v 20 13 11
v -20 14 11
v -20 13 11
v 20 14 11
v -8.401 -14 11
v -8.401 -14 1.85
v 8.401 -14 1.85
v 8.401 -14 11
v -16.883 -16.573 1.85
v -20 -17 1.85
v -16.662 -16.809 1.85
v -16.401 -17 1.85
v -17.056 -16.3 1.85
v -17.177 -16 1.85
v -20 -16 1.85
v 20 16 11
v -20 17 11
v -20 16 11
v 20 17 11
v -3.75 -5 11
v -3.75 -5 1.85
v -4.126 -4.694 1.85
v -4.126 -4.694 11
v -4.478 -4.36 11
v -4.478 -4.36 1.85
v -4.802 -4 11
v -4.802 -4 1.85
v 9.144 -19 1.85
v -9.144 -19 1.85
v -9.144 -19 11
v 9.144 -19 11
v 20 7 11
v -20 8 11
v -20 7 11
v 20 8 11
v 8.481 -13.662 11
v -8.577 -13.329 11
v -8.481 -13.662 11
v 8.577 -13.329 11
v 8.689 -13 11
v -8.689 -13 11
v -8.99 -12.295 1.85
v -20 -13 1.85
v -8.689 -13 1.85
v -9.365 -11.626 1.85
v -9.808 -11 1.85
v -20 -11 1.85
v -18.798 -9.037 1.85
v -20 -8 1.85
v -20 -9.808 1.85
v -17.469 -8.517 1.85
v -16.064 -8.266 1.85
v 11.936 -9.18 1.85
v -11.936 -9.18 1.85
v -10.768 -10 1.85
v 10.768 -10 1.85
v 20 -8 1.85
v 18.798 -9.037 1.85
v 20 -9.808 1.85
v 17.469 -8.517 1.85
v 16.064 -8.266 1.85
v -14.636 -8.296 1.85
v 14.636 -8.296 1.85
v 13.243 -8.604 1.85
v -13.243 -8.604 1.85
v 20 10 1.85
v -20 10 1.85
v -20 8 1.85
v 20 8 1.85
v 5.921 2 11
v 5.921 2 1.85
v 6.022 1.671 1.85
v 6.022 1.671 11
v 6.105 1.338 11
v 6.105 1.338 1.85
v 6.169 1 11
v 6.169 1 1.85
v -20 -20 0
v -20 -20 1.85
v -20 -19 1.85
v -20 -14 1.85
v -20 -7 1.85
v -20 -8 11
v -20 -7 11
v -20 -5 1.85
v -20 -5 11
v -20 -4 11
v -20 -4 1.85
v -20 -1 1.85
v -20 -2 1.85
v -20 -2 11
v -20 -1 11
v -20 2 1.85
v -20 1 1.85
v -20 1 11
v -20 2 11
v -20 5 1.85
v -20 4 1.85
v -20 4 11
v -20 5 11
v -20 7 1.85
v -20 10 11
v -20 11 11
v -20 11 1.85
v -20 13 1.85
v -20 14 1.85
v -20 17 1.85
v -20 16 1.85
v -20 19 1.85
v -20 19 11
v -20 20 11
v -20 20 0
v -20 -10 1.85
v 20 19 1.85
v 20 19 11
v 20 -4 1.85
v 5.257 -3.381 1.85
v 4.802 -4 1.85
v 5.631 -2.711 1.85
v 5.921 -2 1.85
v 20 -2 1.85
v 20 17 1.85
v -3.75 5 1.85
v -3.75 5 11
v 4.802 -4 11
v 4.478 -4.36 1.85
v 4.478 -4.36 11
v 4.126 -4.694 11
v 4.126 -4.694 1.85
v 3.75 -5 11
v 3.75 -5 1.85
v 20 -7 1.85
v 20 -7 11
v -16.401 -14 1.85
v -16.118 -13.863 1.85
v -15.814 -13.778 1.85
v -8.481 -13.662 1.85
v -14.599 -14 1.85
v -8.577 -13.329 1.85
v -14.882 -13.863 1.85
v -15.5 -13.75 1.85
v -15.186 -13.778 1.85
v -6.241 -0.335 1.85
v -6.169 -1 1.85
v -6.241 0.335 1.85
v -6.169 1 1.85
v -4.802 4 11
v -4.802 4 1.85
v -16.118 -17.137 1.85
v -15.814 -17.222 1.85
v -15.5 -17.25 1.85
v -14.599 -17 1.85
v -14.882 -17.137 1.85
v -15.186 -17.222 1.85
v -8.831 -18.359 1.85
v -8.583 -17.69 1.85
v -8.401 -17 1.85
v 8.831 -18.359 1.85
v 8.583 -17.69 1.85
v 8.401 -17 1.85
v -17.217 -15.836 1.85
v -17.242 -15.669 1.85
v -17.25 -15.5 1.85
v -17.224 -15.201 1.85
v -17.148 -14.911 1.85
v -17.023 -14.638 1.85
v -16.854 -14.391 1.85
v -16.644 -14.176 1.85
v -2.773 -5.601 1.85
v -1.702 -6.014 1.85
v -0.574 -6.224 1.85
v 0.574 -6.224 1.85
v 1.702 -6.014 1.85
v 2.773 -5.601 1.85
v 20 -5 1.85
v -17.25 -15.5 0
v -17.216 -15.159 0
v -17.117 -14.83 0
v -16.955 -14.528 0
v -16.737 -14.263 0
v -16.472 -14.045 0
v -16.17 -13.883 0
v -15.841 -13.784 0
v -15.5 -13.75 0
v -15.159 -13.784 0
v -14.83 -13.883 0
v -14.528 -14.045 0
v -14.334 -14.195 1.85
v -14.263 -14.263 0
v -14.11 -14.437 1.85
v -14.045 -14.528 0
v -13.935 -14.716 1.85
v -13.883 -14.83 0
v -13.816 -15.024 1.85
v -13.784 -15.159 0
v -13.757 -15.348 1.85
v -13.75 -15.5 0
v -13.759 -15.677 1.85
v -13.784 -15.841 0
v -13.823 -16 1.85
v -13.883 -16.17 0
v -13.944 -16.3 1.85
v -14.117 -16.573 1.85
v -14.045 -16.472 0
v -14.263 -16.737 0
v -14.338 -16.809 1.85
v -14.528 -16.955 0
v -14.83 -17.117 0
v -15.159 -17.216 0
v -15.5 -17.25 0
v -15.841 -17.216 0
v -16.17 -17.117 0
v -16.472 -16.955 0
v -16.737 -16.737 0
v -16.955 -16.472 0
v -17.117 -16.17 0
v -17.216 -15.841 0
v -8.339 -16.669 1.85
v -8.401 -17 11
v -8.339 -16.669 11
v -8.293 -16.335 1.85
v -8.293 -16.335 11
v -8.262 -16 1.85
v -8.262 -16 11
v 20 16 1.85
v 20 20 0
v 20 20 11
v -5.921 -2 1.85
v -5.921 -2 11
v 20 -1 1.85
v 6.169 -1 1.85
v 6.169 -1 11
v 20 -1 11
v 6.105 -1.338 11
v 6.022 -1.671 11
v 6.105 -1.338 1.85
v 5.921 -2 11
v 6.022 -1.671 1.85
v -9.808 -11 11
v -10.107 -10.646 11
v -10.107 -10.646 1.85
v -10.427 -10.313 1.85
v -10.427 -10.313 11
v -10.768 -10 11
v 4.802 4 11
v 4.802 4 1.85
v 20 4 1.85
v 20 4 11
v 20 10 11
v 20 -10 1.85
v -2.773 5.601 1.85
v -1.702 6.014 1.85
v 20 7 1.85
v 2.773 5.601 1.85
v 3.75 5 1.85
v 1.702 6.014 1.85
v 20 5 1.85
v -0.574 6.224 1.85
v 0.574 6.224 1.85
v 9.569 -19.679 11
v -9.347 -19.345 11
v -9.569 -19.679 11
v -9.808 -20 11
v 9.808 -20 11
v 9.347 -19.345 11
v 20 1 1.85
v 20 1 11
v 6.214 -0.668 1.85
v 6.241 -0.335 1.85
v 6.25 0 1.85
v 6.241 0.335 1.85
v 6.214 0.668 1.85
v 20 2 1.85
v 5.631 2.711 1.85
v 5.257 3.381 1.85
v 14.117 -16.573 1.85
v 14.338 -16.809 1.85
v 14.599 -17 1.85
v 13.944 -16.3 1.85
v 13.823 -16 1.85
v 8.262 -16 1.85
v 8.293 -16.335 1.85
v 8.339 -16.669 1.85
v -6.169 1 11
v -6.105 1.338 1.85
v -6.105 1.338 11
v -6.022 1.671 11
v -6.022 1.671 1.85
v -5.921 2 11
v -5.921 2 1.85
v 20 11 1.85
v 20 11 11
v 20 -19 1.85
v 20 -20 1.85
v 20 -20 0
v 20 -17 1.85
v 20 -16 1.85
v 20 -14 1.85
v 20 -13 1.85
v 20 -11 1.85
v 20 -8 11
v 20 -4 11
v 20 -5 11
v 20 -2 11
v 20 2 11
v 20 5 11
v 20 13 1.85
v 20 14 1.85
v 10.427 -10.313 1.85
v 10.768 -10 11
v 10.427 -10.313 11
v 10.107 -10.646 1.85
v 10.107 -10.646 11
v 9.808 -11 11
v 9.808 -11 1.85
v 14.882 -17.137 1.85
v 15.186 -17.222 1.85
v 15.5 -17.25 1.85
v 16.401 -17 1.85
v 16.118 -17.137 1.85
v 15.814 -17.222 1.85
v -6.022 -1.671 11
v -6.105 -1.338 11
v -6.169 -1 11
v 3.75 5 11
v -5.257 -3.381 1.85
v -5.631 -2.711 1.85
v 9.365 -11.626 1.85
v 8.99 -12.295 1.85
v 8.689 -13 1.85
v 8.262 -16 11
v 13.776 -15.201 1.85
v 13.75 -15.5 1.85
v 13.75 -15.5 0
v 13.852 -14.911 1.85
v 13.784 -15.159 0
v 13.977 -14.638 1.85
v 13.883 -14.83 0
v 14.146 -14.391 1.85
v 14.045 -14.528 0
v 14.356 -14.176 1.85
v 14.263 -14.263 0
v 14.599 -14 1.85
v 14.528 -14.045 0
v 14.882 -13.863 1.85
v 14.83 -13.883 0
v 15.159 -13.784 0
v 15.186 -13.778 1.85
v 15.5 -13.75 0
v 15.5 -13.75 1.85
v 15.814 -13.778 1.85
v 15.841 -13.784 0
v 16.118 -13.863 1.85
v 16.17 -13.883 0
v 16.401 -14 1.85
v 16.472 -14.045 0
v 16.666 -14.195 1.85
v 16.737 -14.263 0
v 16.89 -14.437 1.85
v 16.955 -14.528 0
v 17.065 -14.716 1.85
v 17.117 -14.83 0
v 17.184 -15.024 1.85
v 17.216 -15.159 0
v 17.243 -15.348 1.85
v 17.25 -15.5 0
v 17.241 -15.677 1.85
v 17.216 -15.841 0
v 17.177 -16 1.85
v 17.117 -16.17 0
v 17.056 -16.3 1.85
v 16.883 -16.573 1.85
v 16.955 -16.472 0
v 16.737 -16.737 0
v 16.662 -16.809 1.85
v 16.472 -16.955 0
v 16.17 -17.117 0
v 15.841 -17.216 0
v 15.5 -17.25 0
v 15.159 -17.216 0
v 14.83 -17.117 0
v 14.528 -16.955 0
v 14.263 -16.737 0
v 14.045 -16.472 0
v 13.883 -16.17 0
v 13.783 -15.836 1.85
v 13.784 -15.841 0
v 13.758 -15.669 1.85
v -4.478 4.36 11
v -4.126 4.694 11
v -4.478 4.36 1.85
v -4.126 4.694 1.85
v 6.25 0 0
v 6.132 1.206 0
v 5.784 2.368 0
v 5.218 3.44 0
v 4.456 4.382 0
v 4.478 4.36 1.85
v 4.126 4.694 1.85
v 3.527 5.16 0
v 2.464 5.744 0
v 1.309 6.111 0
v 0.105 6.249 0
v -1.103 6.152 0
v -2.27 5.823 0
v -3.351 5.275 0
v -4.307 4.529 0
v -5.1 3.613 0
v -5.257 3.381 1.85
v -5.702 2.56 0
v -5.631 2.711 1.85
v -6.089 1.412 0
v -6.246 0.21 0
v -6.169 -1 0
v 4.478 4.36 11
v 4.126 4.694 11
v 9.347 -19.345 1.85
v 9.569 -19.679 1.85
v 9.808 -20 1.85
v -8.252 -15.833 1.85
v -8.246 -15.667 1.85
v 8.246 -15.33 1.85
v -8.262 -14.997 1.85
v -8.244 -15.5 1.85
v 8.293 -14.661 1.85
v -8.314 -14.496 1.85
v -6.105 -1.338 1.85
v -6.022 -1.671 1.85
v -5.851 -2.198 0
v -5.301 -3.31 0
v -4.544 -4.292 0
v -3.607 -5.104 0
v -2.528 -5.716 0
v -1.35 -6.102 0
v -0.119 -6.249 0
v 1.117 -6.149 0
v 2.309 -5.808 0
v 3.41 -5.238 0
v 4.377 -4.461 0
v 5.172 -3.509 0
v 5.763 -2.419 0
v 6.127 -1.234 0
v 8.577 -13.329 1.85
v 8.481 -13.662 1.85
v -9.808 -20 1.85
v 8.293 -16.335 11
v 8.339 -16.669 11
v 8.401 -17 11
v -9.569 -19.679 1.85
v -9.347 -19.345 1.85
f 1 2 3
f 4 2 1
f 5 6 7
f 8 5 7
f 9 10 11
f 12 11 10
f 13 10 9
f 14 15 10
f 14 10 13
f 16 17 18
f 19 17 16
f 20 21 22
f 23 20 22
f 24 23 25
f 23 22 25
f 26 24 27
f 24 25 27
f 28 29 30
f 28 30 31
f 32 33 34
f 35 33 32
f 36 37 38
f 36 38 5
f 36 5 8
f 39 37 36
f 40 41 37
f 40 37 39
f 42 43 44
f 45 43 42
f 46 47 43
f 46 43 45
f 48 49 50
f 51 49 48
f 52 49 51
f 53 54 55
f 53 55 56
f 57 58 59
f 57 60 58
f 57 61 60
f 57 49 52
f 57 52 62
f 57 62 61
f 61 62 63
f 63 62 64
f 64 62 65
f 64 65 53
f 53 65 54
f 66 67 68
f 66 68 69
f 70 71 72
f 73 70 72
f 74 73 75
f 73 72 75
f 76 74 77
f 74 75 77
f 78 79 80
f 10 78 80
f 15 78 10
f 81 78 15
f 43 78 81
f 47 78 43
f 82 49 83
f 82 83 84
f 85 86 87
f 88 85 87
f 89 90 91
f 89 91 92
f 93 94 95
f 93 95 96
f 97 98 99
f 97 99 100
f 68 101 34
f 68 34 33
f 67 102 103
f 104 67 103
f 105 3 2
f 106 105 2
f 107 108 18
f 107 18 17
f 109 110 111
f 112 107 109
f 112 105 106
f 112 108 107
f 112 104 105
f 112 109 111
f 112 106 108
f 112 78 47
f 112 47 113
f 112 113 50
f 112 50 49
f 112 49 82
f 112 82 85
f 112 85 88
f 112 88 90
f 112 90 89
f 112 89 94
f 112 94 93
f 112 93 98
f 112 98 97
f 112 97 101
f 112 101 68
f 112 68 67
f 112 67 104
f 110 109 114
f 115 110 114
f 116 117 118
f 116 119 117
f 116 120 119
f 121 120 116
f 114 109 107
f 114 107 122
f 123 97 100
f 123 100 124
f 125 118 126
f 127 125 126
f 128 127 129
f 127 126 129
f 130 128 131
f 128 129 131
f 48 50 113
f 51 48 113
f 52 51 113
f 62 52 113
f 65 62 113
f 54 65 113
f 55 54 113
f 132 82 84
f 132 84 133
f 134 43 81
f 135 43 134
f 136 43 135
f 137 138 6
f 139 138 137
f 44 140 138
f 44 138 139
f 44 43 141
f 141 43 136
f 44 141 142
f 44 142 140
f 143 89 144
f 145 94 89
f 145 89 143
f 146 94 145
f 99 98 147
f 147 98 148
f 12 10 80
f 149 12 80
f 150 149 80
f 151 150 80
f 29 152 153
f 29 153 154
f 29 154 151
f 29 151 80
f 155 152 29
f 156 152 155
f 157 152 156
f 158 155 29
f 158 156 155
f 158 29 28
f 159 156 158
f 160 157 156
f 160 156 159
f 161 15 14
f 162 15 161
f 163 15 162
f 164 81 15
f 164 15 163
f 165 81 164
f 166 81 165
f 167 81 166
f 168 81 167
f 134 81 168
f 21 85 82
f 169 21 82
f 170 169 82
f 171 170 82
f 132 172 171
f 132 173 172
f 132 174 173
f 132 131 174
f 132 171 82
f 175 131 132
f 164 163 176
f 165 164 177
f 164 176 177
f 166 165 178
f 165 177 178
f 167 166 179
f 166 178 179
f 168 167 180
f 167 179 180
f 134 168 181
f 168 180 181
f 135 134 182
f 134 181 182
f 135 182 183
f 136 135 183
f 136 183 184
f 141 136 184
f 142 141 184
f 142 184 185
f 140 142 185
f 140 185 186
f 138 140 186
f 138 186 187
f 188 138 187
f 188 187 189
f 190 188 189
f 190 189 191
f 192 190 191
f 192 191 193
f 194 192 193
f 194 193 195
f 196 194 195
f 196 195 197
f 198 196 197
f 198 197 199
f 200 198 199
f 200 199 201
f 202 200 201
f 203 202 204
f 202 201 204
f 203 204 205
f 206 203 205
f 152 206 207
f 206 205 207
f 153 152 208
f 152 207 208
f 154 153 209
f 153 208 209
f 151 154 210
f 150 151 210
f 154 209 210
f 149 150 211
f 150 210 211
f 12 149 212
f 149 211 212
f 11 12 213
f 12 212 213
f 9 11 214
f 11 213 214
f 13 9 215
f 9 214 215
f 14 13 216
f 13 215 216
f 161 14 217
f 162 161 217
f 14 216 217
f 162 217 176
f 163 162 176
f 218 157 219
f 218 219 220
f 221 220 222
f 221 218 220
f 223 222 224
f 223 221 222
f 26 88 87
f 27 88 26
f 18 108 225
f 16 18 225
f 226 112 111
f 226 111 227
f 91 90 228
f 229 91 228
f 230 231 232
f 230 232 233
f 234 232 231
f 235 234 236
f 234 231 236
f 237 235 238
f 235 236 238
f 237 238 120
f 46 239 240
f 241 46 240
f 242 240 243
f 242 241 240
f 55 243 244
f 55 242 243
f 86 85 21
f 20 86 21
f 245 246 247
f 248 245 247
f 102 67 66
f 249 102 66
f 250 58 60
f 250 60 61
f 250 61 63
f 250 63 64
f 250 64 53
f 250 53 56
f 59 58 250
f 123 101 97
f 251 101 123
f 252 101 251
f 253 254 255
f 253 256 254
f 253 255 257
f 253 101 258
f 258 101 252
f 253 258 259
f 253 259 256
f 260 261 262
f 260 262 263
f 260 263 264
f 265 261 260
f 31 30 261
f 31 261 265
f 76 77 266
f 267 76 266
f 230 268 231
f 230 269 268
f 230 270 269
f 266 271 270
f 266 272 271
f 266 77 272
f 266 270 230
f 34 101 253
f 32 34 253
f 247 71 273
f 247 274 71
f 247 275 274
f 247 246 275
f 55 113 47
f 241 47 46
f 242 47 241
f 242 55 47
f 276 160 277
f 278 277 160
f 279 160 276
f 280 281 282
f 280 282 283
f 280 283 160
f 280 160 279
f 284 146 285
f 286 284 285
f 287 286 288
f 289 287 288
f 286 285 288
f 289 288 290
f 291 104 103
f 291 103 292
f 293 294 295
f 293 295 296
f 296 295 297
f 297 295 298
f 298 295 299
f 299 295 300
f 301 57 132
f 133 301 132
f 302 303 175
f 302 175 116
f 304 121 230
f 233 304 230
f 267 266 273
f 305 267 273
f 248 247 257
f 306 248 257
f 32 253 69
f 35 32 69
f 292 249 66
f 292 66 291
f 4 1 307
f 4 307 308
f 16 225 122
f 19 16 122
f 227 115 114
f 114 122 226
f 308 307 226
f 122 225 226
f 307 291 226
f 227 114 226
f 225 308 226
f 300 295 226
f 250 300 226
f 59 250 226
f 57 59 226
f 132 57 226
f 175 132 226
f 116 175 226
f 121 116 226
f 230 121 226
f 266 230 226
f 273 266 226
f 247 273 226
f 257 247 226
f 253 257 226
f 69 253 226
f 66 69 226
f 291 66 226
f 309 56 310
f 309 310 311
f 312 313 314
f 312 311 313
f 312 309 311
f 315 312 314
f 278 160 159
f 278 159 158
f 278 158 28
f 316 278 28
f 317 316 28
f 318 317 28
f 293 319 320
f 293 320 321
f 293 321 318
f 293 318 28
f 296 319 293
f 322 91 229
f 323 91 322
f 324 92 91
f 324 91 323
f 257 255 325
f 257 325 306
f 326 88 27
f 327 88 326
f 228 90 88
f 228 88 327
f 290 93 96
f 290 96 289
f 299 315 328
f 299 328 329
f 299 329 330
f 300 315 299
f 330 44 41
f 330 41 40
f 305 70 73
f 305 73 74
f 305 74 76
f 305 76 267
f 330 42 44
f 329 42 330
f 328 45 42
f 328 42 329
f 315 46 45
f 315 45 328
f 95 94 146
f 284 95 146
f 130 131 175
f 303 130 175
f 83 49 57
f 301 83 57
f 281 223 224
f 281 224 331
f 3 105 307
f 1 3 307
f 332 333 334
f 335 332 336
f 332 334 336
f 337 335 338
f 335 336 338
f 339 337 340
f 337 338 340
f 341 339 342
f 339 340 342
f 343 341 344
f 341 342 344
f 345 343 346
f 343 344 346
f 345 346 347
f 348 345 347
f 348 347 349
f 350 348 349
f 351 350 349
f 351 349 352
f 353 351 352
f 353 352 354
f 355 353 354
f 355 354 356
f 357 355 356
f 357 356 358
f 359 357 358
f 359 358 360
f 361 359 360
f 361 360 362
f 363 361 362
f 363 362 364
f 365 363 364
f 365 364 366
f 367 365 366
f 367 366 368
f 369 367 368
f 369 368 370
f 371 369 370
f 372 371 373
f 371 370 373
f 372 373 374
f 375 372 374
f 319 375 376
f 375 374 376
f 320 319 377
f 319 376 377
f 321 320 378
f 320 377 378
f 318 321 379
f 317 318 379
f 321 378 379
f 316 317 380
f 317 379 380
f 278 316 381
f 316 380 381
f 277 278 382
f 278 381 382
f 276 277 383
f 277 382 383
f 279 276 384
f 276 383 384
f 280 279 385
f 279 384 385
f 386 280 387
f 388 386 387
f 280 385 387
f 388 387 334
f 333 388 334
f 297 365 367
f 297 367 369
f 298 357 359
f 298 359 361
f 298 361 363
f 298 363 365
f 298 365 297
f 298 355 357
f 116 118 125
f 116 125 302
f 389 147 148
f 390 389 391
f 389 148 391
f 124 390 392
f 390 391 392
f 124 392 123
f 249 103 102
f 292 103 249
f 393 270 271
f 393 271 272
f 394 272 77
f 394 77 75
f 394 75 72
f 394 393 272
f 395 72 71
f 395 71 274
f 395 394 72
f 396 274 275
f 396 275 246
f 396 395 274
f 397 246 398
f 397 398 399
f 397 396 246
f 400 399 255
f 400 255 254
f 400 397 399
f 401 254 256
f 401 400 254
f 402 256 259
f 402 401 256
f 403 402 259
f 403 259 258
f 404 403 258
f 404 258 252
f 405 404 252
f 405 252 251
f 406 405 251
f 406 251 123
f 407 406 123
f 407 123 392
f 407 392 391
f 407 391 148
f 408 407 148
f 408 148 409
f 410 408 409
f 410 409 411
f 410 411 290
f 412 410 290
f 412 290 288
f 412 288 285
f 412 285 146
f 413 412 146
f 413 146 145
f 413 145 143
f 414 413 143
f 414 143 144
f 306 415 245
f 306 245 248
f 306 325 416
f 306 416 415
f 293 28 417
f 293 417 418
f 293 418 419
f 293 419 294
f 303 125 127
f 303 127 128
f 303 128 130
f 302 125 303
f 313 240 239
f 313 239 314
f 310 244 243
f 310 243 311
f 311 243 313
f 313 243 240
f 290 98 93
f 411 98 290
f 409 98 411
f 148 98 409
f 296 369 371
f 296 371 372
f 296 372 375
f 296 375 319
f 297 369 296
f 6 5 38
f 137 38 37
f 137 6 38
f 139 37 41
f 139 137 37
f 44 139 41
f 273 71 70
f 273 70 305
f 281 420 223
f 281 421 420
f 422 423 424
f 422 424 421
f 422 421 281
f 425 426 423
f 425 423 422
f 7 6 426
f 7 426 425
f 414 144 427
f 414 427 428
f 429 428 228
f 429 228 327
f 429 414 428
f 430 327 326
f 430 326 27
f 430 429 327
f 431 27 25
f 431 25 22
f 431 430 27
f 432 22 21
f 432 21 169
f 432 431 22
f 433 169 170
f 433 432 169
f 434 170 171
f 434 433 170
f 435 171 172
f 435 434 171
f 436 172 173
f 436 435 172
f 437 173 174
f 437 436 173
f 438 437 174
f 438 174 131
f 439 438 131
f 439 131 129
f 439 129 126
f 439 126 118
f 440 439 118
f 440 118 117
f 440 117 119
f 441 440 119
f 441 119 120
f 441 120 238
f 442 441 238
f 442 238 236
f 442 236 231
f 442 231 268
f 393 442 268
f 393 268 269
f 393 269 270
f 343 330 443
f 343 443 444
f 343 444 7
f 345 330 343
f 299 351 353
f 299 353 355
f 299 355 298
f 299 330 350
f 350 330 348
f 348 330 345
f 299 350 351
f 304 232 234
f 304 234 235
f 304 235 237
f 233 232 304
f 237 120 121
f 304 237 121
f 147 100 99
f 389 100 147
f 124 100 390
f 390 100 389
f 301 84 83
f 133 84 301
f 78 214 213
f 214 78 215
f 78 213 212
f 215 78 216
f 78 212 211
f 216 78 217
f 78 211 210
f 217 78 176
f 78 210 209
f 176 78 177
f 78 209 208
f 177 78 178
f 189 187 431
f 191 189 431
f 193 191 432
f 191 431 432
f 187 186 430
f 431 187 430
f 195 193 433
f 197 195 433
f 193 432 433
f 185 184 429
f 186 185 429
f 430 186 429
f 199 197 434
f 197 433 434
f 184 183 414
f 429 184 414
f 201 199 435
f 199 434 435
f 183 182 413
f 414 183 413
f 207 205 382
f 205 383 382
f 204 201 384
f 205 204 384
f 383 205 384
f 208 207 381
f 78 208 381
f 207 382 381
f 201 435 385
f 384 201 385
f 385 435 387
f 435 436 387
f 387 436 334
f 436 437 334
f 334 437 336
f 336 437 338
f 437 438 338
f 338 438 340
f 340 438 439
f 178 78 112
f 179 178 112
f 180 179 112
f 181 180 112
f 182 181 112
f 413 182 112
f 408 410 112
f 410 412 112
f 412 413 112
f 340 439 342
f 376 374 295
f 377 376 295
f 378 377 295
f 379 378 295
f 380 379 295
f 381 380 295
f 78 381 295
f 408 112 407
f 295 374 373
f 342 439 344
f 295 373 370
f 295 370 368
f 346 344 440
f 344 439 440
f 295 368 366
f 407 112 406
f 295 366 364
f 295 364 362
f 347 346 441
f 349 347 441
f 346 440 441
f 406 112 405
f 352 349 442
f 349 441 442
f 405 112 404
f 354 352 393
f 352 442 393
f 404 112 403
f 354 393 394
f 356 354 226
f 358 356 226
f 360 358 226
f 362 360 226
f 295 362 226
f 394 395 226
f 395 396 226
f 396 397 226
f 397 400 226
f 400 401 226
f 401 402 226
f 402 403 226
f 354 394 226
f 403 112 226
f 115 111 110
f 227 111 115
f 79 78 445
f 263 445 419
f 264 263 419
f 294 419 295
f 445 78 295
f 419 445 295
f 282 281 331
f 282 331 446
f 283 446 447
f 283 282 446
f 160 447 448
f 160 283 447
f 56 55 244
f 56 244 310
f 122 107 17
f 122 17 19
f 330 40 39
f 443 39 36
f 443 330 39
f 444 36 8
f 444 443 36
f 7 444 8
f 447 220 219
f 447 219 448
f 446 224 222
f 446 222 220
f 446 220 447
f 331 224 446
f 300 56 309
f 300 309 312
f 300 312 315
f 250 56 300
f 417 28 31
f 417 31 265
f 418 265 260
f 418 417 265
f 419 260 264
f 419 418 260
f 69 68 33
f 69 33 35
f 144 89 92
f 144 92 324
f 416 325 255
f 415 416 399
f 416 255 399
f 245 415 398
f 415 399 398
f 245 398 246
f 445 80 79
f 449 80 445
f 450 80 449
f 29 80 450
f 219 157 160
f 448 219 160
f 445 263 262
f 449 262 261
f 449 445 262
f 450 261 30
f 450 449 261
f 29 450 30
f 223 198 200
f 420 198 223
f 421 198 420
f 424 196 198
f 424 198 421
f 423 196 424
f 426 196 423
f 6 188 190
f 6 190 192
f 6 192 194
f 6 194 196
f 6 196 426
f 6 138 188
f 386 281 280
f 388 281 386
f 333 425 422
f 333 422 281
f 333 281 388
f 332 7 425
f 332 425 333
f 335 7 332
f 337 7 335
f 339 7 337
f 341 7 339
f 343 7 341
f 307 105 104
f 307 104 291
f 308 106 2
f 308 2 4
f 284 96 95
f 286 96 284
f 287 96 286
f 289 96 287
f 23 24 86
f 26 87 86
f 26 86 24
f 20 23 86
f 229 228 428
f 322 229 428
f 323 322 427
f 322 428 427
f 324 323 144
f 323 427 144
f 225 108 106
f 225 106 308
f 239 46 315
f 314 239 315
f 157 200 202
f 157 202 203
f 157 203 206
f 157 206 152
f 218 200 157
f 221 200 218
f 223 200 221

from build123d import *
from build123d.topology import SkipClean

# Parameters (mm, degrees)
SKETCH_1_W          = 40
SKETCH_1_H          = 40
SKETCH_1_R          = 6.25
EXTRUDE_1_DEPTH     = 1.85
SKETCH_2_W          = 40
SKETCH_2_H          = 1
EXTRUDE_2_DEPTH     = 9.15
SKETCH_3_R          = 1.75
SKETCH_3_R_2        = 6.25
CUT_EXTRUDE_5_DEPTH = 31.347981811
SKETCH_4_R          = 7.255719344
CUT_EXTRUDE_6_DEPTH = 16.15


with BuildPart() as part:
    # 草图1 → 凸台-拉伸1 (new body)
    with BuildSketch(Plane.XY):
        Rectangle(SKETCH_1_W, SKETCH_1_H)
        Circle(SKETCH_1_R, mode=Mode.SUBTRACT)
    extrude(amount=EXTRUDE_1_DEPTH)

    # 草图2 → 凸台-拉伸2 (add)
    with BuildSketch(Plane.XY.offset(1.85)):
        with Locations((0, 19.5)):
            Rectangle(SKETCH_2_W, SKETCH_2_H)
        with Locations((0, 16.5)):
            Rectangle(SKETCH_2_W, SKETCH_2_H)
        with Locations((0, 13.5)):
            Rectangle(SKETCH_2_W, SKETCH_2_H)
        with Locations((0, 10.5)):
            Rectangle(SKETCH_2_W, SKETCH_2_H)
        with Locations((0, 7.5)):
            Rectangle(SKETCH_2_W, SKETCH_2_H)
        with Locations((0, 4.5)):
            Rectangle(SKETCH_2_W, SKETCH_2_H)
        with Locations((0, 1.5)):
            Rectangle(SKETCH_2_W, SKETCH_2_H)
        with Locations((0, -1.5)):
            Rectangle(SKETCH_2_W, SKETCH_2_H)
        with Locations((0, -4.5)):
            Rectangle(SKETCH_2_W, SKETCH_2_H)
        with Locations((0, -7.5)):
            Rectangle(SKETCH_2_W, SKETCH_2_H)
        with Locations((0, -10.5)):
            Rectangle(SKETCH_2_W, SKETCH_2_H)
        with Locations((0, -13.5)):
            Rectangle(SKETCH_2_W, SKETCH_2_H)
        with Locations((0, -16.5)):
            Rectangle(SKETCH_2_W, SKETCH_2_H)
        with Locations((0, -19.5)):
            Rectangle(SKETCH_2_W, SKETCH_2_H)
    extrude(amount=EXTRUDE_2_DEPTH)

    # 草图3 → 切除-拉伸5 (cut, through all)
    with SkipClean():  # the faces are left unmerged after this step: merging them gives an invalid solid
        with BuildSketch(Plane(origin=(0, 0, 0), x_dir=(-1, 0, 0), z_dir=(0, 0, -1))):
            with Locations((-15.5, -15.5)):
                Circle(SKETCH_3_R)
            with Locations((15.5, -15.5)):
                Circle(SKETCH_3_R)
            with Locations(Location((0, 0, 0), (0, 0, 350.793103779))):
                Circle(SKETCH_3_R_2)
        extrude(amount=-CUT_EXTRUDE_5_DEPTH, mode=Mode.SUBTRACT)

    # 草图4 → 切除-拉伸6 (cut)
    with SkipClean():  # the faces are left unmerged after this step: merging them gives an invalid solid
        with BuildSketch(Plane.XY.offset(1.85)):
            with Locations((-15.5, -15.5)):
                Circle(SKETCH_4_R)
            with Locations((15.5, -15.5)):
                Circle(SKETCH_4_R)
        extrude(amount=CUT_EXTRUDE_6_DEPTH, mode=Mode.SUBTRACT)


solid = part.part
